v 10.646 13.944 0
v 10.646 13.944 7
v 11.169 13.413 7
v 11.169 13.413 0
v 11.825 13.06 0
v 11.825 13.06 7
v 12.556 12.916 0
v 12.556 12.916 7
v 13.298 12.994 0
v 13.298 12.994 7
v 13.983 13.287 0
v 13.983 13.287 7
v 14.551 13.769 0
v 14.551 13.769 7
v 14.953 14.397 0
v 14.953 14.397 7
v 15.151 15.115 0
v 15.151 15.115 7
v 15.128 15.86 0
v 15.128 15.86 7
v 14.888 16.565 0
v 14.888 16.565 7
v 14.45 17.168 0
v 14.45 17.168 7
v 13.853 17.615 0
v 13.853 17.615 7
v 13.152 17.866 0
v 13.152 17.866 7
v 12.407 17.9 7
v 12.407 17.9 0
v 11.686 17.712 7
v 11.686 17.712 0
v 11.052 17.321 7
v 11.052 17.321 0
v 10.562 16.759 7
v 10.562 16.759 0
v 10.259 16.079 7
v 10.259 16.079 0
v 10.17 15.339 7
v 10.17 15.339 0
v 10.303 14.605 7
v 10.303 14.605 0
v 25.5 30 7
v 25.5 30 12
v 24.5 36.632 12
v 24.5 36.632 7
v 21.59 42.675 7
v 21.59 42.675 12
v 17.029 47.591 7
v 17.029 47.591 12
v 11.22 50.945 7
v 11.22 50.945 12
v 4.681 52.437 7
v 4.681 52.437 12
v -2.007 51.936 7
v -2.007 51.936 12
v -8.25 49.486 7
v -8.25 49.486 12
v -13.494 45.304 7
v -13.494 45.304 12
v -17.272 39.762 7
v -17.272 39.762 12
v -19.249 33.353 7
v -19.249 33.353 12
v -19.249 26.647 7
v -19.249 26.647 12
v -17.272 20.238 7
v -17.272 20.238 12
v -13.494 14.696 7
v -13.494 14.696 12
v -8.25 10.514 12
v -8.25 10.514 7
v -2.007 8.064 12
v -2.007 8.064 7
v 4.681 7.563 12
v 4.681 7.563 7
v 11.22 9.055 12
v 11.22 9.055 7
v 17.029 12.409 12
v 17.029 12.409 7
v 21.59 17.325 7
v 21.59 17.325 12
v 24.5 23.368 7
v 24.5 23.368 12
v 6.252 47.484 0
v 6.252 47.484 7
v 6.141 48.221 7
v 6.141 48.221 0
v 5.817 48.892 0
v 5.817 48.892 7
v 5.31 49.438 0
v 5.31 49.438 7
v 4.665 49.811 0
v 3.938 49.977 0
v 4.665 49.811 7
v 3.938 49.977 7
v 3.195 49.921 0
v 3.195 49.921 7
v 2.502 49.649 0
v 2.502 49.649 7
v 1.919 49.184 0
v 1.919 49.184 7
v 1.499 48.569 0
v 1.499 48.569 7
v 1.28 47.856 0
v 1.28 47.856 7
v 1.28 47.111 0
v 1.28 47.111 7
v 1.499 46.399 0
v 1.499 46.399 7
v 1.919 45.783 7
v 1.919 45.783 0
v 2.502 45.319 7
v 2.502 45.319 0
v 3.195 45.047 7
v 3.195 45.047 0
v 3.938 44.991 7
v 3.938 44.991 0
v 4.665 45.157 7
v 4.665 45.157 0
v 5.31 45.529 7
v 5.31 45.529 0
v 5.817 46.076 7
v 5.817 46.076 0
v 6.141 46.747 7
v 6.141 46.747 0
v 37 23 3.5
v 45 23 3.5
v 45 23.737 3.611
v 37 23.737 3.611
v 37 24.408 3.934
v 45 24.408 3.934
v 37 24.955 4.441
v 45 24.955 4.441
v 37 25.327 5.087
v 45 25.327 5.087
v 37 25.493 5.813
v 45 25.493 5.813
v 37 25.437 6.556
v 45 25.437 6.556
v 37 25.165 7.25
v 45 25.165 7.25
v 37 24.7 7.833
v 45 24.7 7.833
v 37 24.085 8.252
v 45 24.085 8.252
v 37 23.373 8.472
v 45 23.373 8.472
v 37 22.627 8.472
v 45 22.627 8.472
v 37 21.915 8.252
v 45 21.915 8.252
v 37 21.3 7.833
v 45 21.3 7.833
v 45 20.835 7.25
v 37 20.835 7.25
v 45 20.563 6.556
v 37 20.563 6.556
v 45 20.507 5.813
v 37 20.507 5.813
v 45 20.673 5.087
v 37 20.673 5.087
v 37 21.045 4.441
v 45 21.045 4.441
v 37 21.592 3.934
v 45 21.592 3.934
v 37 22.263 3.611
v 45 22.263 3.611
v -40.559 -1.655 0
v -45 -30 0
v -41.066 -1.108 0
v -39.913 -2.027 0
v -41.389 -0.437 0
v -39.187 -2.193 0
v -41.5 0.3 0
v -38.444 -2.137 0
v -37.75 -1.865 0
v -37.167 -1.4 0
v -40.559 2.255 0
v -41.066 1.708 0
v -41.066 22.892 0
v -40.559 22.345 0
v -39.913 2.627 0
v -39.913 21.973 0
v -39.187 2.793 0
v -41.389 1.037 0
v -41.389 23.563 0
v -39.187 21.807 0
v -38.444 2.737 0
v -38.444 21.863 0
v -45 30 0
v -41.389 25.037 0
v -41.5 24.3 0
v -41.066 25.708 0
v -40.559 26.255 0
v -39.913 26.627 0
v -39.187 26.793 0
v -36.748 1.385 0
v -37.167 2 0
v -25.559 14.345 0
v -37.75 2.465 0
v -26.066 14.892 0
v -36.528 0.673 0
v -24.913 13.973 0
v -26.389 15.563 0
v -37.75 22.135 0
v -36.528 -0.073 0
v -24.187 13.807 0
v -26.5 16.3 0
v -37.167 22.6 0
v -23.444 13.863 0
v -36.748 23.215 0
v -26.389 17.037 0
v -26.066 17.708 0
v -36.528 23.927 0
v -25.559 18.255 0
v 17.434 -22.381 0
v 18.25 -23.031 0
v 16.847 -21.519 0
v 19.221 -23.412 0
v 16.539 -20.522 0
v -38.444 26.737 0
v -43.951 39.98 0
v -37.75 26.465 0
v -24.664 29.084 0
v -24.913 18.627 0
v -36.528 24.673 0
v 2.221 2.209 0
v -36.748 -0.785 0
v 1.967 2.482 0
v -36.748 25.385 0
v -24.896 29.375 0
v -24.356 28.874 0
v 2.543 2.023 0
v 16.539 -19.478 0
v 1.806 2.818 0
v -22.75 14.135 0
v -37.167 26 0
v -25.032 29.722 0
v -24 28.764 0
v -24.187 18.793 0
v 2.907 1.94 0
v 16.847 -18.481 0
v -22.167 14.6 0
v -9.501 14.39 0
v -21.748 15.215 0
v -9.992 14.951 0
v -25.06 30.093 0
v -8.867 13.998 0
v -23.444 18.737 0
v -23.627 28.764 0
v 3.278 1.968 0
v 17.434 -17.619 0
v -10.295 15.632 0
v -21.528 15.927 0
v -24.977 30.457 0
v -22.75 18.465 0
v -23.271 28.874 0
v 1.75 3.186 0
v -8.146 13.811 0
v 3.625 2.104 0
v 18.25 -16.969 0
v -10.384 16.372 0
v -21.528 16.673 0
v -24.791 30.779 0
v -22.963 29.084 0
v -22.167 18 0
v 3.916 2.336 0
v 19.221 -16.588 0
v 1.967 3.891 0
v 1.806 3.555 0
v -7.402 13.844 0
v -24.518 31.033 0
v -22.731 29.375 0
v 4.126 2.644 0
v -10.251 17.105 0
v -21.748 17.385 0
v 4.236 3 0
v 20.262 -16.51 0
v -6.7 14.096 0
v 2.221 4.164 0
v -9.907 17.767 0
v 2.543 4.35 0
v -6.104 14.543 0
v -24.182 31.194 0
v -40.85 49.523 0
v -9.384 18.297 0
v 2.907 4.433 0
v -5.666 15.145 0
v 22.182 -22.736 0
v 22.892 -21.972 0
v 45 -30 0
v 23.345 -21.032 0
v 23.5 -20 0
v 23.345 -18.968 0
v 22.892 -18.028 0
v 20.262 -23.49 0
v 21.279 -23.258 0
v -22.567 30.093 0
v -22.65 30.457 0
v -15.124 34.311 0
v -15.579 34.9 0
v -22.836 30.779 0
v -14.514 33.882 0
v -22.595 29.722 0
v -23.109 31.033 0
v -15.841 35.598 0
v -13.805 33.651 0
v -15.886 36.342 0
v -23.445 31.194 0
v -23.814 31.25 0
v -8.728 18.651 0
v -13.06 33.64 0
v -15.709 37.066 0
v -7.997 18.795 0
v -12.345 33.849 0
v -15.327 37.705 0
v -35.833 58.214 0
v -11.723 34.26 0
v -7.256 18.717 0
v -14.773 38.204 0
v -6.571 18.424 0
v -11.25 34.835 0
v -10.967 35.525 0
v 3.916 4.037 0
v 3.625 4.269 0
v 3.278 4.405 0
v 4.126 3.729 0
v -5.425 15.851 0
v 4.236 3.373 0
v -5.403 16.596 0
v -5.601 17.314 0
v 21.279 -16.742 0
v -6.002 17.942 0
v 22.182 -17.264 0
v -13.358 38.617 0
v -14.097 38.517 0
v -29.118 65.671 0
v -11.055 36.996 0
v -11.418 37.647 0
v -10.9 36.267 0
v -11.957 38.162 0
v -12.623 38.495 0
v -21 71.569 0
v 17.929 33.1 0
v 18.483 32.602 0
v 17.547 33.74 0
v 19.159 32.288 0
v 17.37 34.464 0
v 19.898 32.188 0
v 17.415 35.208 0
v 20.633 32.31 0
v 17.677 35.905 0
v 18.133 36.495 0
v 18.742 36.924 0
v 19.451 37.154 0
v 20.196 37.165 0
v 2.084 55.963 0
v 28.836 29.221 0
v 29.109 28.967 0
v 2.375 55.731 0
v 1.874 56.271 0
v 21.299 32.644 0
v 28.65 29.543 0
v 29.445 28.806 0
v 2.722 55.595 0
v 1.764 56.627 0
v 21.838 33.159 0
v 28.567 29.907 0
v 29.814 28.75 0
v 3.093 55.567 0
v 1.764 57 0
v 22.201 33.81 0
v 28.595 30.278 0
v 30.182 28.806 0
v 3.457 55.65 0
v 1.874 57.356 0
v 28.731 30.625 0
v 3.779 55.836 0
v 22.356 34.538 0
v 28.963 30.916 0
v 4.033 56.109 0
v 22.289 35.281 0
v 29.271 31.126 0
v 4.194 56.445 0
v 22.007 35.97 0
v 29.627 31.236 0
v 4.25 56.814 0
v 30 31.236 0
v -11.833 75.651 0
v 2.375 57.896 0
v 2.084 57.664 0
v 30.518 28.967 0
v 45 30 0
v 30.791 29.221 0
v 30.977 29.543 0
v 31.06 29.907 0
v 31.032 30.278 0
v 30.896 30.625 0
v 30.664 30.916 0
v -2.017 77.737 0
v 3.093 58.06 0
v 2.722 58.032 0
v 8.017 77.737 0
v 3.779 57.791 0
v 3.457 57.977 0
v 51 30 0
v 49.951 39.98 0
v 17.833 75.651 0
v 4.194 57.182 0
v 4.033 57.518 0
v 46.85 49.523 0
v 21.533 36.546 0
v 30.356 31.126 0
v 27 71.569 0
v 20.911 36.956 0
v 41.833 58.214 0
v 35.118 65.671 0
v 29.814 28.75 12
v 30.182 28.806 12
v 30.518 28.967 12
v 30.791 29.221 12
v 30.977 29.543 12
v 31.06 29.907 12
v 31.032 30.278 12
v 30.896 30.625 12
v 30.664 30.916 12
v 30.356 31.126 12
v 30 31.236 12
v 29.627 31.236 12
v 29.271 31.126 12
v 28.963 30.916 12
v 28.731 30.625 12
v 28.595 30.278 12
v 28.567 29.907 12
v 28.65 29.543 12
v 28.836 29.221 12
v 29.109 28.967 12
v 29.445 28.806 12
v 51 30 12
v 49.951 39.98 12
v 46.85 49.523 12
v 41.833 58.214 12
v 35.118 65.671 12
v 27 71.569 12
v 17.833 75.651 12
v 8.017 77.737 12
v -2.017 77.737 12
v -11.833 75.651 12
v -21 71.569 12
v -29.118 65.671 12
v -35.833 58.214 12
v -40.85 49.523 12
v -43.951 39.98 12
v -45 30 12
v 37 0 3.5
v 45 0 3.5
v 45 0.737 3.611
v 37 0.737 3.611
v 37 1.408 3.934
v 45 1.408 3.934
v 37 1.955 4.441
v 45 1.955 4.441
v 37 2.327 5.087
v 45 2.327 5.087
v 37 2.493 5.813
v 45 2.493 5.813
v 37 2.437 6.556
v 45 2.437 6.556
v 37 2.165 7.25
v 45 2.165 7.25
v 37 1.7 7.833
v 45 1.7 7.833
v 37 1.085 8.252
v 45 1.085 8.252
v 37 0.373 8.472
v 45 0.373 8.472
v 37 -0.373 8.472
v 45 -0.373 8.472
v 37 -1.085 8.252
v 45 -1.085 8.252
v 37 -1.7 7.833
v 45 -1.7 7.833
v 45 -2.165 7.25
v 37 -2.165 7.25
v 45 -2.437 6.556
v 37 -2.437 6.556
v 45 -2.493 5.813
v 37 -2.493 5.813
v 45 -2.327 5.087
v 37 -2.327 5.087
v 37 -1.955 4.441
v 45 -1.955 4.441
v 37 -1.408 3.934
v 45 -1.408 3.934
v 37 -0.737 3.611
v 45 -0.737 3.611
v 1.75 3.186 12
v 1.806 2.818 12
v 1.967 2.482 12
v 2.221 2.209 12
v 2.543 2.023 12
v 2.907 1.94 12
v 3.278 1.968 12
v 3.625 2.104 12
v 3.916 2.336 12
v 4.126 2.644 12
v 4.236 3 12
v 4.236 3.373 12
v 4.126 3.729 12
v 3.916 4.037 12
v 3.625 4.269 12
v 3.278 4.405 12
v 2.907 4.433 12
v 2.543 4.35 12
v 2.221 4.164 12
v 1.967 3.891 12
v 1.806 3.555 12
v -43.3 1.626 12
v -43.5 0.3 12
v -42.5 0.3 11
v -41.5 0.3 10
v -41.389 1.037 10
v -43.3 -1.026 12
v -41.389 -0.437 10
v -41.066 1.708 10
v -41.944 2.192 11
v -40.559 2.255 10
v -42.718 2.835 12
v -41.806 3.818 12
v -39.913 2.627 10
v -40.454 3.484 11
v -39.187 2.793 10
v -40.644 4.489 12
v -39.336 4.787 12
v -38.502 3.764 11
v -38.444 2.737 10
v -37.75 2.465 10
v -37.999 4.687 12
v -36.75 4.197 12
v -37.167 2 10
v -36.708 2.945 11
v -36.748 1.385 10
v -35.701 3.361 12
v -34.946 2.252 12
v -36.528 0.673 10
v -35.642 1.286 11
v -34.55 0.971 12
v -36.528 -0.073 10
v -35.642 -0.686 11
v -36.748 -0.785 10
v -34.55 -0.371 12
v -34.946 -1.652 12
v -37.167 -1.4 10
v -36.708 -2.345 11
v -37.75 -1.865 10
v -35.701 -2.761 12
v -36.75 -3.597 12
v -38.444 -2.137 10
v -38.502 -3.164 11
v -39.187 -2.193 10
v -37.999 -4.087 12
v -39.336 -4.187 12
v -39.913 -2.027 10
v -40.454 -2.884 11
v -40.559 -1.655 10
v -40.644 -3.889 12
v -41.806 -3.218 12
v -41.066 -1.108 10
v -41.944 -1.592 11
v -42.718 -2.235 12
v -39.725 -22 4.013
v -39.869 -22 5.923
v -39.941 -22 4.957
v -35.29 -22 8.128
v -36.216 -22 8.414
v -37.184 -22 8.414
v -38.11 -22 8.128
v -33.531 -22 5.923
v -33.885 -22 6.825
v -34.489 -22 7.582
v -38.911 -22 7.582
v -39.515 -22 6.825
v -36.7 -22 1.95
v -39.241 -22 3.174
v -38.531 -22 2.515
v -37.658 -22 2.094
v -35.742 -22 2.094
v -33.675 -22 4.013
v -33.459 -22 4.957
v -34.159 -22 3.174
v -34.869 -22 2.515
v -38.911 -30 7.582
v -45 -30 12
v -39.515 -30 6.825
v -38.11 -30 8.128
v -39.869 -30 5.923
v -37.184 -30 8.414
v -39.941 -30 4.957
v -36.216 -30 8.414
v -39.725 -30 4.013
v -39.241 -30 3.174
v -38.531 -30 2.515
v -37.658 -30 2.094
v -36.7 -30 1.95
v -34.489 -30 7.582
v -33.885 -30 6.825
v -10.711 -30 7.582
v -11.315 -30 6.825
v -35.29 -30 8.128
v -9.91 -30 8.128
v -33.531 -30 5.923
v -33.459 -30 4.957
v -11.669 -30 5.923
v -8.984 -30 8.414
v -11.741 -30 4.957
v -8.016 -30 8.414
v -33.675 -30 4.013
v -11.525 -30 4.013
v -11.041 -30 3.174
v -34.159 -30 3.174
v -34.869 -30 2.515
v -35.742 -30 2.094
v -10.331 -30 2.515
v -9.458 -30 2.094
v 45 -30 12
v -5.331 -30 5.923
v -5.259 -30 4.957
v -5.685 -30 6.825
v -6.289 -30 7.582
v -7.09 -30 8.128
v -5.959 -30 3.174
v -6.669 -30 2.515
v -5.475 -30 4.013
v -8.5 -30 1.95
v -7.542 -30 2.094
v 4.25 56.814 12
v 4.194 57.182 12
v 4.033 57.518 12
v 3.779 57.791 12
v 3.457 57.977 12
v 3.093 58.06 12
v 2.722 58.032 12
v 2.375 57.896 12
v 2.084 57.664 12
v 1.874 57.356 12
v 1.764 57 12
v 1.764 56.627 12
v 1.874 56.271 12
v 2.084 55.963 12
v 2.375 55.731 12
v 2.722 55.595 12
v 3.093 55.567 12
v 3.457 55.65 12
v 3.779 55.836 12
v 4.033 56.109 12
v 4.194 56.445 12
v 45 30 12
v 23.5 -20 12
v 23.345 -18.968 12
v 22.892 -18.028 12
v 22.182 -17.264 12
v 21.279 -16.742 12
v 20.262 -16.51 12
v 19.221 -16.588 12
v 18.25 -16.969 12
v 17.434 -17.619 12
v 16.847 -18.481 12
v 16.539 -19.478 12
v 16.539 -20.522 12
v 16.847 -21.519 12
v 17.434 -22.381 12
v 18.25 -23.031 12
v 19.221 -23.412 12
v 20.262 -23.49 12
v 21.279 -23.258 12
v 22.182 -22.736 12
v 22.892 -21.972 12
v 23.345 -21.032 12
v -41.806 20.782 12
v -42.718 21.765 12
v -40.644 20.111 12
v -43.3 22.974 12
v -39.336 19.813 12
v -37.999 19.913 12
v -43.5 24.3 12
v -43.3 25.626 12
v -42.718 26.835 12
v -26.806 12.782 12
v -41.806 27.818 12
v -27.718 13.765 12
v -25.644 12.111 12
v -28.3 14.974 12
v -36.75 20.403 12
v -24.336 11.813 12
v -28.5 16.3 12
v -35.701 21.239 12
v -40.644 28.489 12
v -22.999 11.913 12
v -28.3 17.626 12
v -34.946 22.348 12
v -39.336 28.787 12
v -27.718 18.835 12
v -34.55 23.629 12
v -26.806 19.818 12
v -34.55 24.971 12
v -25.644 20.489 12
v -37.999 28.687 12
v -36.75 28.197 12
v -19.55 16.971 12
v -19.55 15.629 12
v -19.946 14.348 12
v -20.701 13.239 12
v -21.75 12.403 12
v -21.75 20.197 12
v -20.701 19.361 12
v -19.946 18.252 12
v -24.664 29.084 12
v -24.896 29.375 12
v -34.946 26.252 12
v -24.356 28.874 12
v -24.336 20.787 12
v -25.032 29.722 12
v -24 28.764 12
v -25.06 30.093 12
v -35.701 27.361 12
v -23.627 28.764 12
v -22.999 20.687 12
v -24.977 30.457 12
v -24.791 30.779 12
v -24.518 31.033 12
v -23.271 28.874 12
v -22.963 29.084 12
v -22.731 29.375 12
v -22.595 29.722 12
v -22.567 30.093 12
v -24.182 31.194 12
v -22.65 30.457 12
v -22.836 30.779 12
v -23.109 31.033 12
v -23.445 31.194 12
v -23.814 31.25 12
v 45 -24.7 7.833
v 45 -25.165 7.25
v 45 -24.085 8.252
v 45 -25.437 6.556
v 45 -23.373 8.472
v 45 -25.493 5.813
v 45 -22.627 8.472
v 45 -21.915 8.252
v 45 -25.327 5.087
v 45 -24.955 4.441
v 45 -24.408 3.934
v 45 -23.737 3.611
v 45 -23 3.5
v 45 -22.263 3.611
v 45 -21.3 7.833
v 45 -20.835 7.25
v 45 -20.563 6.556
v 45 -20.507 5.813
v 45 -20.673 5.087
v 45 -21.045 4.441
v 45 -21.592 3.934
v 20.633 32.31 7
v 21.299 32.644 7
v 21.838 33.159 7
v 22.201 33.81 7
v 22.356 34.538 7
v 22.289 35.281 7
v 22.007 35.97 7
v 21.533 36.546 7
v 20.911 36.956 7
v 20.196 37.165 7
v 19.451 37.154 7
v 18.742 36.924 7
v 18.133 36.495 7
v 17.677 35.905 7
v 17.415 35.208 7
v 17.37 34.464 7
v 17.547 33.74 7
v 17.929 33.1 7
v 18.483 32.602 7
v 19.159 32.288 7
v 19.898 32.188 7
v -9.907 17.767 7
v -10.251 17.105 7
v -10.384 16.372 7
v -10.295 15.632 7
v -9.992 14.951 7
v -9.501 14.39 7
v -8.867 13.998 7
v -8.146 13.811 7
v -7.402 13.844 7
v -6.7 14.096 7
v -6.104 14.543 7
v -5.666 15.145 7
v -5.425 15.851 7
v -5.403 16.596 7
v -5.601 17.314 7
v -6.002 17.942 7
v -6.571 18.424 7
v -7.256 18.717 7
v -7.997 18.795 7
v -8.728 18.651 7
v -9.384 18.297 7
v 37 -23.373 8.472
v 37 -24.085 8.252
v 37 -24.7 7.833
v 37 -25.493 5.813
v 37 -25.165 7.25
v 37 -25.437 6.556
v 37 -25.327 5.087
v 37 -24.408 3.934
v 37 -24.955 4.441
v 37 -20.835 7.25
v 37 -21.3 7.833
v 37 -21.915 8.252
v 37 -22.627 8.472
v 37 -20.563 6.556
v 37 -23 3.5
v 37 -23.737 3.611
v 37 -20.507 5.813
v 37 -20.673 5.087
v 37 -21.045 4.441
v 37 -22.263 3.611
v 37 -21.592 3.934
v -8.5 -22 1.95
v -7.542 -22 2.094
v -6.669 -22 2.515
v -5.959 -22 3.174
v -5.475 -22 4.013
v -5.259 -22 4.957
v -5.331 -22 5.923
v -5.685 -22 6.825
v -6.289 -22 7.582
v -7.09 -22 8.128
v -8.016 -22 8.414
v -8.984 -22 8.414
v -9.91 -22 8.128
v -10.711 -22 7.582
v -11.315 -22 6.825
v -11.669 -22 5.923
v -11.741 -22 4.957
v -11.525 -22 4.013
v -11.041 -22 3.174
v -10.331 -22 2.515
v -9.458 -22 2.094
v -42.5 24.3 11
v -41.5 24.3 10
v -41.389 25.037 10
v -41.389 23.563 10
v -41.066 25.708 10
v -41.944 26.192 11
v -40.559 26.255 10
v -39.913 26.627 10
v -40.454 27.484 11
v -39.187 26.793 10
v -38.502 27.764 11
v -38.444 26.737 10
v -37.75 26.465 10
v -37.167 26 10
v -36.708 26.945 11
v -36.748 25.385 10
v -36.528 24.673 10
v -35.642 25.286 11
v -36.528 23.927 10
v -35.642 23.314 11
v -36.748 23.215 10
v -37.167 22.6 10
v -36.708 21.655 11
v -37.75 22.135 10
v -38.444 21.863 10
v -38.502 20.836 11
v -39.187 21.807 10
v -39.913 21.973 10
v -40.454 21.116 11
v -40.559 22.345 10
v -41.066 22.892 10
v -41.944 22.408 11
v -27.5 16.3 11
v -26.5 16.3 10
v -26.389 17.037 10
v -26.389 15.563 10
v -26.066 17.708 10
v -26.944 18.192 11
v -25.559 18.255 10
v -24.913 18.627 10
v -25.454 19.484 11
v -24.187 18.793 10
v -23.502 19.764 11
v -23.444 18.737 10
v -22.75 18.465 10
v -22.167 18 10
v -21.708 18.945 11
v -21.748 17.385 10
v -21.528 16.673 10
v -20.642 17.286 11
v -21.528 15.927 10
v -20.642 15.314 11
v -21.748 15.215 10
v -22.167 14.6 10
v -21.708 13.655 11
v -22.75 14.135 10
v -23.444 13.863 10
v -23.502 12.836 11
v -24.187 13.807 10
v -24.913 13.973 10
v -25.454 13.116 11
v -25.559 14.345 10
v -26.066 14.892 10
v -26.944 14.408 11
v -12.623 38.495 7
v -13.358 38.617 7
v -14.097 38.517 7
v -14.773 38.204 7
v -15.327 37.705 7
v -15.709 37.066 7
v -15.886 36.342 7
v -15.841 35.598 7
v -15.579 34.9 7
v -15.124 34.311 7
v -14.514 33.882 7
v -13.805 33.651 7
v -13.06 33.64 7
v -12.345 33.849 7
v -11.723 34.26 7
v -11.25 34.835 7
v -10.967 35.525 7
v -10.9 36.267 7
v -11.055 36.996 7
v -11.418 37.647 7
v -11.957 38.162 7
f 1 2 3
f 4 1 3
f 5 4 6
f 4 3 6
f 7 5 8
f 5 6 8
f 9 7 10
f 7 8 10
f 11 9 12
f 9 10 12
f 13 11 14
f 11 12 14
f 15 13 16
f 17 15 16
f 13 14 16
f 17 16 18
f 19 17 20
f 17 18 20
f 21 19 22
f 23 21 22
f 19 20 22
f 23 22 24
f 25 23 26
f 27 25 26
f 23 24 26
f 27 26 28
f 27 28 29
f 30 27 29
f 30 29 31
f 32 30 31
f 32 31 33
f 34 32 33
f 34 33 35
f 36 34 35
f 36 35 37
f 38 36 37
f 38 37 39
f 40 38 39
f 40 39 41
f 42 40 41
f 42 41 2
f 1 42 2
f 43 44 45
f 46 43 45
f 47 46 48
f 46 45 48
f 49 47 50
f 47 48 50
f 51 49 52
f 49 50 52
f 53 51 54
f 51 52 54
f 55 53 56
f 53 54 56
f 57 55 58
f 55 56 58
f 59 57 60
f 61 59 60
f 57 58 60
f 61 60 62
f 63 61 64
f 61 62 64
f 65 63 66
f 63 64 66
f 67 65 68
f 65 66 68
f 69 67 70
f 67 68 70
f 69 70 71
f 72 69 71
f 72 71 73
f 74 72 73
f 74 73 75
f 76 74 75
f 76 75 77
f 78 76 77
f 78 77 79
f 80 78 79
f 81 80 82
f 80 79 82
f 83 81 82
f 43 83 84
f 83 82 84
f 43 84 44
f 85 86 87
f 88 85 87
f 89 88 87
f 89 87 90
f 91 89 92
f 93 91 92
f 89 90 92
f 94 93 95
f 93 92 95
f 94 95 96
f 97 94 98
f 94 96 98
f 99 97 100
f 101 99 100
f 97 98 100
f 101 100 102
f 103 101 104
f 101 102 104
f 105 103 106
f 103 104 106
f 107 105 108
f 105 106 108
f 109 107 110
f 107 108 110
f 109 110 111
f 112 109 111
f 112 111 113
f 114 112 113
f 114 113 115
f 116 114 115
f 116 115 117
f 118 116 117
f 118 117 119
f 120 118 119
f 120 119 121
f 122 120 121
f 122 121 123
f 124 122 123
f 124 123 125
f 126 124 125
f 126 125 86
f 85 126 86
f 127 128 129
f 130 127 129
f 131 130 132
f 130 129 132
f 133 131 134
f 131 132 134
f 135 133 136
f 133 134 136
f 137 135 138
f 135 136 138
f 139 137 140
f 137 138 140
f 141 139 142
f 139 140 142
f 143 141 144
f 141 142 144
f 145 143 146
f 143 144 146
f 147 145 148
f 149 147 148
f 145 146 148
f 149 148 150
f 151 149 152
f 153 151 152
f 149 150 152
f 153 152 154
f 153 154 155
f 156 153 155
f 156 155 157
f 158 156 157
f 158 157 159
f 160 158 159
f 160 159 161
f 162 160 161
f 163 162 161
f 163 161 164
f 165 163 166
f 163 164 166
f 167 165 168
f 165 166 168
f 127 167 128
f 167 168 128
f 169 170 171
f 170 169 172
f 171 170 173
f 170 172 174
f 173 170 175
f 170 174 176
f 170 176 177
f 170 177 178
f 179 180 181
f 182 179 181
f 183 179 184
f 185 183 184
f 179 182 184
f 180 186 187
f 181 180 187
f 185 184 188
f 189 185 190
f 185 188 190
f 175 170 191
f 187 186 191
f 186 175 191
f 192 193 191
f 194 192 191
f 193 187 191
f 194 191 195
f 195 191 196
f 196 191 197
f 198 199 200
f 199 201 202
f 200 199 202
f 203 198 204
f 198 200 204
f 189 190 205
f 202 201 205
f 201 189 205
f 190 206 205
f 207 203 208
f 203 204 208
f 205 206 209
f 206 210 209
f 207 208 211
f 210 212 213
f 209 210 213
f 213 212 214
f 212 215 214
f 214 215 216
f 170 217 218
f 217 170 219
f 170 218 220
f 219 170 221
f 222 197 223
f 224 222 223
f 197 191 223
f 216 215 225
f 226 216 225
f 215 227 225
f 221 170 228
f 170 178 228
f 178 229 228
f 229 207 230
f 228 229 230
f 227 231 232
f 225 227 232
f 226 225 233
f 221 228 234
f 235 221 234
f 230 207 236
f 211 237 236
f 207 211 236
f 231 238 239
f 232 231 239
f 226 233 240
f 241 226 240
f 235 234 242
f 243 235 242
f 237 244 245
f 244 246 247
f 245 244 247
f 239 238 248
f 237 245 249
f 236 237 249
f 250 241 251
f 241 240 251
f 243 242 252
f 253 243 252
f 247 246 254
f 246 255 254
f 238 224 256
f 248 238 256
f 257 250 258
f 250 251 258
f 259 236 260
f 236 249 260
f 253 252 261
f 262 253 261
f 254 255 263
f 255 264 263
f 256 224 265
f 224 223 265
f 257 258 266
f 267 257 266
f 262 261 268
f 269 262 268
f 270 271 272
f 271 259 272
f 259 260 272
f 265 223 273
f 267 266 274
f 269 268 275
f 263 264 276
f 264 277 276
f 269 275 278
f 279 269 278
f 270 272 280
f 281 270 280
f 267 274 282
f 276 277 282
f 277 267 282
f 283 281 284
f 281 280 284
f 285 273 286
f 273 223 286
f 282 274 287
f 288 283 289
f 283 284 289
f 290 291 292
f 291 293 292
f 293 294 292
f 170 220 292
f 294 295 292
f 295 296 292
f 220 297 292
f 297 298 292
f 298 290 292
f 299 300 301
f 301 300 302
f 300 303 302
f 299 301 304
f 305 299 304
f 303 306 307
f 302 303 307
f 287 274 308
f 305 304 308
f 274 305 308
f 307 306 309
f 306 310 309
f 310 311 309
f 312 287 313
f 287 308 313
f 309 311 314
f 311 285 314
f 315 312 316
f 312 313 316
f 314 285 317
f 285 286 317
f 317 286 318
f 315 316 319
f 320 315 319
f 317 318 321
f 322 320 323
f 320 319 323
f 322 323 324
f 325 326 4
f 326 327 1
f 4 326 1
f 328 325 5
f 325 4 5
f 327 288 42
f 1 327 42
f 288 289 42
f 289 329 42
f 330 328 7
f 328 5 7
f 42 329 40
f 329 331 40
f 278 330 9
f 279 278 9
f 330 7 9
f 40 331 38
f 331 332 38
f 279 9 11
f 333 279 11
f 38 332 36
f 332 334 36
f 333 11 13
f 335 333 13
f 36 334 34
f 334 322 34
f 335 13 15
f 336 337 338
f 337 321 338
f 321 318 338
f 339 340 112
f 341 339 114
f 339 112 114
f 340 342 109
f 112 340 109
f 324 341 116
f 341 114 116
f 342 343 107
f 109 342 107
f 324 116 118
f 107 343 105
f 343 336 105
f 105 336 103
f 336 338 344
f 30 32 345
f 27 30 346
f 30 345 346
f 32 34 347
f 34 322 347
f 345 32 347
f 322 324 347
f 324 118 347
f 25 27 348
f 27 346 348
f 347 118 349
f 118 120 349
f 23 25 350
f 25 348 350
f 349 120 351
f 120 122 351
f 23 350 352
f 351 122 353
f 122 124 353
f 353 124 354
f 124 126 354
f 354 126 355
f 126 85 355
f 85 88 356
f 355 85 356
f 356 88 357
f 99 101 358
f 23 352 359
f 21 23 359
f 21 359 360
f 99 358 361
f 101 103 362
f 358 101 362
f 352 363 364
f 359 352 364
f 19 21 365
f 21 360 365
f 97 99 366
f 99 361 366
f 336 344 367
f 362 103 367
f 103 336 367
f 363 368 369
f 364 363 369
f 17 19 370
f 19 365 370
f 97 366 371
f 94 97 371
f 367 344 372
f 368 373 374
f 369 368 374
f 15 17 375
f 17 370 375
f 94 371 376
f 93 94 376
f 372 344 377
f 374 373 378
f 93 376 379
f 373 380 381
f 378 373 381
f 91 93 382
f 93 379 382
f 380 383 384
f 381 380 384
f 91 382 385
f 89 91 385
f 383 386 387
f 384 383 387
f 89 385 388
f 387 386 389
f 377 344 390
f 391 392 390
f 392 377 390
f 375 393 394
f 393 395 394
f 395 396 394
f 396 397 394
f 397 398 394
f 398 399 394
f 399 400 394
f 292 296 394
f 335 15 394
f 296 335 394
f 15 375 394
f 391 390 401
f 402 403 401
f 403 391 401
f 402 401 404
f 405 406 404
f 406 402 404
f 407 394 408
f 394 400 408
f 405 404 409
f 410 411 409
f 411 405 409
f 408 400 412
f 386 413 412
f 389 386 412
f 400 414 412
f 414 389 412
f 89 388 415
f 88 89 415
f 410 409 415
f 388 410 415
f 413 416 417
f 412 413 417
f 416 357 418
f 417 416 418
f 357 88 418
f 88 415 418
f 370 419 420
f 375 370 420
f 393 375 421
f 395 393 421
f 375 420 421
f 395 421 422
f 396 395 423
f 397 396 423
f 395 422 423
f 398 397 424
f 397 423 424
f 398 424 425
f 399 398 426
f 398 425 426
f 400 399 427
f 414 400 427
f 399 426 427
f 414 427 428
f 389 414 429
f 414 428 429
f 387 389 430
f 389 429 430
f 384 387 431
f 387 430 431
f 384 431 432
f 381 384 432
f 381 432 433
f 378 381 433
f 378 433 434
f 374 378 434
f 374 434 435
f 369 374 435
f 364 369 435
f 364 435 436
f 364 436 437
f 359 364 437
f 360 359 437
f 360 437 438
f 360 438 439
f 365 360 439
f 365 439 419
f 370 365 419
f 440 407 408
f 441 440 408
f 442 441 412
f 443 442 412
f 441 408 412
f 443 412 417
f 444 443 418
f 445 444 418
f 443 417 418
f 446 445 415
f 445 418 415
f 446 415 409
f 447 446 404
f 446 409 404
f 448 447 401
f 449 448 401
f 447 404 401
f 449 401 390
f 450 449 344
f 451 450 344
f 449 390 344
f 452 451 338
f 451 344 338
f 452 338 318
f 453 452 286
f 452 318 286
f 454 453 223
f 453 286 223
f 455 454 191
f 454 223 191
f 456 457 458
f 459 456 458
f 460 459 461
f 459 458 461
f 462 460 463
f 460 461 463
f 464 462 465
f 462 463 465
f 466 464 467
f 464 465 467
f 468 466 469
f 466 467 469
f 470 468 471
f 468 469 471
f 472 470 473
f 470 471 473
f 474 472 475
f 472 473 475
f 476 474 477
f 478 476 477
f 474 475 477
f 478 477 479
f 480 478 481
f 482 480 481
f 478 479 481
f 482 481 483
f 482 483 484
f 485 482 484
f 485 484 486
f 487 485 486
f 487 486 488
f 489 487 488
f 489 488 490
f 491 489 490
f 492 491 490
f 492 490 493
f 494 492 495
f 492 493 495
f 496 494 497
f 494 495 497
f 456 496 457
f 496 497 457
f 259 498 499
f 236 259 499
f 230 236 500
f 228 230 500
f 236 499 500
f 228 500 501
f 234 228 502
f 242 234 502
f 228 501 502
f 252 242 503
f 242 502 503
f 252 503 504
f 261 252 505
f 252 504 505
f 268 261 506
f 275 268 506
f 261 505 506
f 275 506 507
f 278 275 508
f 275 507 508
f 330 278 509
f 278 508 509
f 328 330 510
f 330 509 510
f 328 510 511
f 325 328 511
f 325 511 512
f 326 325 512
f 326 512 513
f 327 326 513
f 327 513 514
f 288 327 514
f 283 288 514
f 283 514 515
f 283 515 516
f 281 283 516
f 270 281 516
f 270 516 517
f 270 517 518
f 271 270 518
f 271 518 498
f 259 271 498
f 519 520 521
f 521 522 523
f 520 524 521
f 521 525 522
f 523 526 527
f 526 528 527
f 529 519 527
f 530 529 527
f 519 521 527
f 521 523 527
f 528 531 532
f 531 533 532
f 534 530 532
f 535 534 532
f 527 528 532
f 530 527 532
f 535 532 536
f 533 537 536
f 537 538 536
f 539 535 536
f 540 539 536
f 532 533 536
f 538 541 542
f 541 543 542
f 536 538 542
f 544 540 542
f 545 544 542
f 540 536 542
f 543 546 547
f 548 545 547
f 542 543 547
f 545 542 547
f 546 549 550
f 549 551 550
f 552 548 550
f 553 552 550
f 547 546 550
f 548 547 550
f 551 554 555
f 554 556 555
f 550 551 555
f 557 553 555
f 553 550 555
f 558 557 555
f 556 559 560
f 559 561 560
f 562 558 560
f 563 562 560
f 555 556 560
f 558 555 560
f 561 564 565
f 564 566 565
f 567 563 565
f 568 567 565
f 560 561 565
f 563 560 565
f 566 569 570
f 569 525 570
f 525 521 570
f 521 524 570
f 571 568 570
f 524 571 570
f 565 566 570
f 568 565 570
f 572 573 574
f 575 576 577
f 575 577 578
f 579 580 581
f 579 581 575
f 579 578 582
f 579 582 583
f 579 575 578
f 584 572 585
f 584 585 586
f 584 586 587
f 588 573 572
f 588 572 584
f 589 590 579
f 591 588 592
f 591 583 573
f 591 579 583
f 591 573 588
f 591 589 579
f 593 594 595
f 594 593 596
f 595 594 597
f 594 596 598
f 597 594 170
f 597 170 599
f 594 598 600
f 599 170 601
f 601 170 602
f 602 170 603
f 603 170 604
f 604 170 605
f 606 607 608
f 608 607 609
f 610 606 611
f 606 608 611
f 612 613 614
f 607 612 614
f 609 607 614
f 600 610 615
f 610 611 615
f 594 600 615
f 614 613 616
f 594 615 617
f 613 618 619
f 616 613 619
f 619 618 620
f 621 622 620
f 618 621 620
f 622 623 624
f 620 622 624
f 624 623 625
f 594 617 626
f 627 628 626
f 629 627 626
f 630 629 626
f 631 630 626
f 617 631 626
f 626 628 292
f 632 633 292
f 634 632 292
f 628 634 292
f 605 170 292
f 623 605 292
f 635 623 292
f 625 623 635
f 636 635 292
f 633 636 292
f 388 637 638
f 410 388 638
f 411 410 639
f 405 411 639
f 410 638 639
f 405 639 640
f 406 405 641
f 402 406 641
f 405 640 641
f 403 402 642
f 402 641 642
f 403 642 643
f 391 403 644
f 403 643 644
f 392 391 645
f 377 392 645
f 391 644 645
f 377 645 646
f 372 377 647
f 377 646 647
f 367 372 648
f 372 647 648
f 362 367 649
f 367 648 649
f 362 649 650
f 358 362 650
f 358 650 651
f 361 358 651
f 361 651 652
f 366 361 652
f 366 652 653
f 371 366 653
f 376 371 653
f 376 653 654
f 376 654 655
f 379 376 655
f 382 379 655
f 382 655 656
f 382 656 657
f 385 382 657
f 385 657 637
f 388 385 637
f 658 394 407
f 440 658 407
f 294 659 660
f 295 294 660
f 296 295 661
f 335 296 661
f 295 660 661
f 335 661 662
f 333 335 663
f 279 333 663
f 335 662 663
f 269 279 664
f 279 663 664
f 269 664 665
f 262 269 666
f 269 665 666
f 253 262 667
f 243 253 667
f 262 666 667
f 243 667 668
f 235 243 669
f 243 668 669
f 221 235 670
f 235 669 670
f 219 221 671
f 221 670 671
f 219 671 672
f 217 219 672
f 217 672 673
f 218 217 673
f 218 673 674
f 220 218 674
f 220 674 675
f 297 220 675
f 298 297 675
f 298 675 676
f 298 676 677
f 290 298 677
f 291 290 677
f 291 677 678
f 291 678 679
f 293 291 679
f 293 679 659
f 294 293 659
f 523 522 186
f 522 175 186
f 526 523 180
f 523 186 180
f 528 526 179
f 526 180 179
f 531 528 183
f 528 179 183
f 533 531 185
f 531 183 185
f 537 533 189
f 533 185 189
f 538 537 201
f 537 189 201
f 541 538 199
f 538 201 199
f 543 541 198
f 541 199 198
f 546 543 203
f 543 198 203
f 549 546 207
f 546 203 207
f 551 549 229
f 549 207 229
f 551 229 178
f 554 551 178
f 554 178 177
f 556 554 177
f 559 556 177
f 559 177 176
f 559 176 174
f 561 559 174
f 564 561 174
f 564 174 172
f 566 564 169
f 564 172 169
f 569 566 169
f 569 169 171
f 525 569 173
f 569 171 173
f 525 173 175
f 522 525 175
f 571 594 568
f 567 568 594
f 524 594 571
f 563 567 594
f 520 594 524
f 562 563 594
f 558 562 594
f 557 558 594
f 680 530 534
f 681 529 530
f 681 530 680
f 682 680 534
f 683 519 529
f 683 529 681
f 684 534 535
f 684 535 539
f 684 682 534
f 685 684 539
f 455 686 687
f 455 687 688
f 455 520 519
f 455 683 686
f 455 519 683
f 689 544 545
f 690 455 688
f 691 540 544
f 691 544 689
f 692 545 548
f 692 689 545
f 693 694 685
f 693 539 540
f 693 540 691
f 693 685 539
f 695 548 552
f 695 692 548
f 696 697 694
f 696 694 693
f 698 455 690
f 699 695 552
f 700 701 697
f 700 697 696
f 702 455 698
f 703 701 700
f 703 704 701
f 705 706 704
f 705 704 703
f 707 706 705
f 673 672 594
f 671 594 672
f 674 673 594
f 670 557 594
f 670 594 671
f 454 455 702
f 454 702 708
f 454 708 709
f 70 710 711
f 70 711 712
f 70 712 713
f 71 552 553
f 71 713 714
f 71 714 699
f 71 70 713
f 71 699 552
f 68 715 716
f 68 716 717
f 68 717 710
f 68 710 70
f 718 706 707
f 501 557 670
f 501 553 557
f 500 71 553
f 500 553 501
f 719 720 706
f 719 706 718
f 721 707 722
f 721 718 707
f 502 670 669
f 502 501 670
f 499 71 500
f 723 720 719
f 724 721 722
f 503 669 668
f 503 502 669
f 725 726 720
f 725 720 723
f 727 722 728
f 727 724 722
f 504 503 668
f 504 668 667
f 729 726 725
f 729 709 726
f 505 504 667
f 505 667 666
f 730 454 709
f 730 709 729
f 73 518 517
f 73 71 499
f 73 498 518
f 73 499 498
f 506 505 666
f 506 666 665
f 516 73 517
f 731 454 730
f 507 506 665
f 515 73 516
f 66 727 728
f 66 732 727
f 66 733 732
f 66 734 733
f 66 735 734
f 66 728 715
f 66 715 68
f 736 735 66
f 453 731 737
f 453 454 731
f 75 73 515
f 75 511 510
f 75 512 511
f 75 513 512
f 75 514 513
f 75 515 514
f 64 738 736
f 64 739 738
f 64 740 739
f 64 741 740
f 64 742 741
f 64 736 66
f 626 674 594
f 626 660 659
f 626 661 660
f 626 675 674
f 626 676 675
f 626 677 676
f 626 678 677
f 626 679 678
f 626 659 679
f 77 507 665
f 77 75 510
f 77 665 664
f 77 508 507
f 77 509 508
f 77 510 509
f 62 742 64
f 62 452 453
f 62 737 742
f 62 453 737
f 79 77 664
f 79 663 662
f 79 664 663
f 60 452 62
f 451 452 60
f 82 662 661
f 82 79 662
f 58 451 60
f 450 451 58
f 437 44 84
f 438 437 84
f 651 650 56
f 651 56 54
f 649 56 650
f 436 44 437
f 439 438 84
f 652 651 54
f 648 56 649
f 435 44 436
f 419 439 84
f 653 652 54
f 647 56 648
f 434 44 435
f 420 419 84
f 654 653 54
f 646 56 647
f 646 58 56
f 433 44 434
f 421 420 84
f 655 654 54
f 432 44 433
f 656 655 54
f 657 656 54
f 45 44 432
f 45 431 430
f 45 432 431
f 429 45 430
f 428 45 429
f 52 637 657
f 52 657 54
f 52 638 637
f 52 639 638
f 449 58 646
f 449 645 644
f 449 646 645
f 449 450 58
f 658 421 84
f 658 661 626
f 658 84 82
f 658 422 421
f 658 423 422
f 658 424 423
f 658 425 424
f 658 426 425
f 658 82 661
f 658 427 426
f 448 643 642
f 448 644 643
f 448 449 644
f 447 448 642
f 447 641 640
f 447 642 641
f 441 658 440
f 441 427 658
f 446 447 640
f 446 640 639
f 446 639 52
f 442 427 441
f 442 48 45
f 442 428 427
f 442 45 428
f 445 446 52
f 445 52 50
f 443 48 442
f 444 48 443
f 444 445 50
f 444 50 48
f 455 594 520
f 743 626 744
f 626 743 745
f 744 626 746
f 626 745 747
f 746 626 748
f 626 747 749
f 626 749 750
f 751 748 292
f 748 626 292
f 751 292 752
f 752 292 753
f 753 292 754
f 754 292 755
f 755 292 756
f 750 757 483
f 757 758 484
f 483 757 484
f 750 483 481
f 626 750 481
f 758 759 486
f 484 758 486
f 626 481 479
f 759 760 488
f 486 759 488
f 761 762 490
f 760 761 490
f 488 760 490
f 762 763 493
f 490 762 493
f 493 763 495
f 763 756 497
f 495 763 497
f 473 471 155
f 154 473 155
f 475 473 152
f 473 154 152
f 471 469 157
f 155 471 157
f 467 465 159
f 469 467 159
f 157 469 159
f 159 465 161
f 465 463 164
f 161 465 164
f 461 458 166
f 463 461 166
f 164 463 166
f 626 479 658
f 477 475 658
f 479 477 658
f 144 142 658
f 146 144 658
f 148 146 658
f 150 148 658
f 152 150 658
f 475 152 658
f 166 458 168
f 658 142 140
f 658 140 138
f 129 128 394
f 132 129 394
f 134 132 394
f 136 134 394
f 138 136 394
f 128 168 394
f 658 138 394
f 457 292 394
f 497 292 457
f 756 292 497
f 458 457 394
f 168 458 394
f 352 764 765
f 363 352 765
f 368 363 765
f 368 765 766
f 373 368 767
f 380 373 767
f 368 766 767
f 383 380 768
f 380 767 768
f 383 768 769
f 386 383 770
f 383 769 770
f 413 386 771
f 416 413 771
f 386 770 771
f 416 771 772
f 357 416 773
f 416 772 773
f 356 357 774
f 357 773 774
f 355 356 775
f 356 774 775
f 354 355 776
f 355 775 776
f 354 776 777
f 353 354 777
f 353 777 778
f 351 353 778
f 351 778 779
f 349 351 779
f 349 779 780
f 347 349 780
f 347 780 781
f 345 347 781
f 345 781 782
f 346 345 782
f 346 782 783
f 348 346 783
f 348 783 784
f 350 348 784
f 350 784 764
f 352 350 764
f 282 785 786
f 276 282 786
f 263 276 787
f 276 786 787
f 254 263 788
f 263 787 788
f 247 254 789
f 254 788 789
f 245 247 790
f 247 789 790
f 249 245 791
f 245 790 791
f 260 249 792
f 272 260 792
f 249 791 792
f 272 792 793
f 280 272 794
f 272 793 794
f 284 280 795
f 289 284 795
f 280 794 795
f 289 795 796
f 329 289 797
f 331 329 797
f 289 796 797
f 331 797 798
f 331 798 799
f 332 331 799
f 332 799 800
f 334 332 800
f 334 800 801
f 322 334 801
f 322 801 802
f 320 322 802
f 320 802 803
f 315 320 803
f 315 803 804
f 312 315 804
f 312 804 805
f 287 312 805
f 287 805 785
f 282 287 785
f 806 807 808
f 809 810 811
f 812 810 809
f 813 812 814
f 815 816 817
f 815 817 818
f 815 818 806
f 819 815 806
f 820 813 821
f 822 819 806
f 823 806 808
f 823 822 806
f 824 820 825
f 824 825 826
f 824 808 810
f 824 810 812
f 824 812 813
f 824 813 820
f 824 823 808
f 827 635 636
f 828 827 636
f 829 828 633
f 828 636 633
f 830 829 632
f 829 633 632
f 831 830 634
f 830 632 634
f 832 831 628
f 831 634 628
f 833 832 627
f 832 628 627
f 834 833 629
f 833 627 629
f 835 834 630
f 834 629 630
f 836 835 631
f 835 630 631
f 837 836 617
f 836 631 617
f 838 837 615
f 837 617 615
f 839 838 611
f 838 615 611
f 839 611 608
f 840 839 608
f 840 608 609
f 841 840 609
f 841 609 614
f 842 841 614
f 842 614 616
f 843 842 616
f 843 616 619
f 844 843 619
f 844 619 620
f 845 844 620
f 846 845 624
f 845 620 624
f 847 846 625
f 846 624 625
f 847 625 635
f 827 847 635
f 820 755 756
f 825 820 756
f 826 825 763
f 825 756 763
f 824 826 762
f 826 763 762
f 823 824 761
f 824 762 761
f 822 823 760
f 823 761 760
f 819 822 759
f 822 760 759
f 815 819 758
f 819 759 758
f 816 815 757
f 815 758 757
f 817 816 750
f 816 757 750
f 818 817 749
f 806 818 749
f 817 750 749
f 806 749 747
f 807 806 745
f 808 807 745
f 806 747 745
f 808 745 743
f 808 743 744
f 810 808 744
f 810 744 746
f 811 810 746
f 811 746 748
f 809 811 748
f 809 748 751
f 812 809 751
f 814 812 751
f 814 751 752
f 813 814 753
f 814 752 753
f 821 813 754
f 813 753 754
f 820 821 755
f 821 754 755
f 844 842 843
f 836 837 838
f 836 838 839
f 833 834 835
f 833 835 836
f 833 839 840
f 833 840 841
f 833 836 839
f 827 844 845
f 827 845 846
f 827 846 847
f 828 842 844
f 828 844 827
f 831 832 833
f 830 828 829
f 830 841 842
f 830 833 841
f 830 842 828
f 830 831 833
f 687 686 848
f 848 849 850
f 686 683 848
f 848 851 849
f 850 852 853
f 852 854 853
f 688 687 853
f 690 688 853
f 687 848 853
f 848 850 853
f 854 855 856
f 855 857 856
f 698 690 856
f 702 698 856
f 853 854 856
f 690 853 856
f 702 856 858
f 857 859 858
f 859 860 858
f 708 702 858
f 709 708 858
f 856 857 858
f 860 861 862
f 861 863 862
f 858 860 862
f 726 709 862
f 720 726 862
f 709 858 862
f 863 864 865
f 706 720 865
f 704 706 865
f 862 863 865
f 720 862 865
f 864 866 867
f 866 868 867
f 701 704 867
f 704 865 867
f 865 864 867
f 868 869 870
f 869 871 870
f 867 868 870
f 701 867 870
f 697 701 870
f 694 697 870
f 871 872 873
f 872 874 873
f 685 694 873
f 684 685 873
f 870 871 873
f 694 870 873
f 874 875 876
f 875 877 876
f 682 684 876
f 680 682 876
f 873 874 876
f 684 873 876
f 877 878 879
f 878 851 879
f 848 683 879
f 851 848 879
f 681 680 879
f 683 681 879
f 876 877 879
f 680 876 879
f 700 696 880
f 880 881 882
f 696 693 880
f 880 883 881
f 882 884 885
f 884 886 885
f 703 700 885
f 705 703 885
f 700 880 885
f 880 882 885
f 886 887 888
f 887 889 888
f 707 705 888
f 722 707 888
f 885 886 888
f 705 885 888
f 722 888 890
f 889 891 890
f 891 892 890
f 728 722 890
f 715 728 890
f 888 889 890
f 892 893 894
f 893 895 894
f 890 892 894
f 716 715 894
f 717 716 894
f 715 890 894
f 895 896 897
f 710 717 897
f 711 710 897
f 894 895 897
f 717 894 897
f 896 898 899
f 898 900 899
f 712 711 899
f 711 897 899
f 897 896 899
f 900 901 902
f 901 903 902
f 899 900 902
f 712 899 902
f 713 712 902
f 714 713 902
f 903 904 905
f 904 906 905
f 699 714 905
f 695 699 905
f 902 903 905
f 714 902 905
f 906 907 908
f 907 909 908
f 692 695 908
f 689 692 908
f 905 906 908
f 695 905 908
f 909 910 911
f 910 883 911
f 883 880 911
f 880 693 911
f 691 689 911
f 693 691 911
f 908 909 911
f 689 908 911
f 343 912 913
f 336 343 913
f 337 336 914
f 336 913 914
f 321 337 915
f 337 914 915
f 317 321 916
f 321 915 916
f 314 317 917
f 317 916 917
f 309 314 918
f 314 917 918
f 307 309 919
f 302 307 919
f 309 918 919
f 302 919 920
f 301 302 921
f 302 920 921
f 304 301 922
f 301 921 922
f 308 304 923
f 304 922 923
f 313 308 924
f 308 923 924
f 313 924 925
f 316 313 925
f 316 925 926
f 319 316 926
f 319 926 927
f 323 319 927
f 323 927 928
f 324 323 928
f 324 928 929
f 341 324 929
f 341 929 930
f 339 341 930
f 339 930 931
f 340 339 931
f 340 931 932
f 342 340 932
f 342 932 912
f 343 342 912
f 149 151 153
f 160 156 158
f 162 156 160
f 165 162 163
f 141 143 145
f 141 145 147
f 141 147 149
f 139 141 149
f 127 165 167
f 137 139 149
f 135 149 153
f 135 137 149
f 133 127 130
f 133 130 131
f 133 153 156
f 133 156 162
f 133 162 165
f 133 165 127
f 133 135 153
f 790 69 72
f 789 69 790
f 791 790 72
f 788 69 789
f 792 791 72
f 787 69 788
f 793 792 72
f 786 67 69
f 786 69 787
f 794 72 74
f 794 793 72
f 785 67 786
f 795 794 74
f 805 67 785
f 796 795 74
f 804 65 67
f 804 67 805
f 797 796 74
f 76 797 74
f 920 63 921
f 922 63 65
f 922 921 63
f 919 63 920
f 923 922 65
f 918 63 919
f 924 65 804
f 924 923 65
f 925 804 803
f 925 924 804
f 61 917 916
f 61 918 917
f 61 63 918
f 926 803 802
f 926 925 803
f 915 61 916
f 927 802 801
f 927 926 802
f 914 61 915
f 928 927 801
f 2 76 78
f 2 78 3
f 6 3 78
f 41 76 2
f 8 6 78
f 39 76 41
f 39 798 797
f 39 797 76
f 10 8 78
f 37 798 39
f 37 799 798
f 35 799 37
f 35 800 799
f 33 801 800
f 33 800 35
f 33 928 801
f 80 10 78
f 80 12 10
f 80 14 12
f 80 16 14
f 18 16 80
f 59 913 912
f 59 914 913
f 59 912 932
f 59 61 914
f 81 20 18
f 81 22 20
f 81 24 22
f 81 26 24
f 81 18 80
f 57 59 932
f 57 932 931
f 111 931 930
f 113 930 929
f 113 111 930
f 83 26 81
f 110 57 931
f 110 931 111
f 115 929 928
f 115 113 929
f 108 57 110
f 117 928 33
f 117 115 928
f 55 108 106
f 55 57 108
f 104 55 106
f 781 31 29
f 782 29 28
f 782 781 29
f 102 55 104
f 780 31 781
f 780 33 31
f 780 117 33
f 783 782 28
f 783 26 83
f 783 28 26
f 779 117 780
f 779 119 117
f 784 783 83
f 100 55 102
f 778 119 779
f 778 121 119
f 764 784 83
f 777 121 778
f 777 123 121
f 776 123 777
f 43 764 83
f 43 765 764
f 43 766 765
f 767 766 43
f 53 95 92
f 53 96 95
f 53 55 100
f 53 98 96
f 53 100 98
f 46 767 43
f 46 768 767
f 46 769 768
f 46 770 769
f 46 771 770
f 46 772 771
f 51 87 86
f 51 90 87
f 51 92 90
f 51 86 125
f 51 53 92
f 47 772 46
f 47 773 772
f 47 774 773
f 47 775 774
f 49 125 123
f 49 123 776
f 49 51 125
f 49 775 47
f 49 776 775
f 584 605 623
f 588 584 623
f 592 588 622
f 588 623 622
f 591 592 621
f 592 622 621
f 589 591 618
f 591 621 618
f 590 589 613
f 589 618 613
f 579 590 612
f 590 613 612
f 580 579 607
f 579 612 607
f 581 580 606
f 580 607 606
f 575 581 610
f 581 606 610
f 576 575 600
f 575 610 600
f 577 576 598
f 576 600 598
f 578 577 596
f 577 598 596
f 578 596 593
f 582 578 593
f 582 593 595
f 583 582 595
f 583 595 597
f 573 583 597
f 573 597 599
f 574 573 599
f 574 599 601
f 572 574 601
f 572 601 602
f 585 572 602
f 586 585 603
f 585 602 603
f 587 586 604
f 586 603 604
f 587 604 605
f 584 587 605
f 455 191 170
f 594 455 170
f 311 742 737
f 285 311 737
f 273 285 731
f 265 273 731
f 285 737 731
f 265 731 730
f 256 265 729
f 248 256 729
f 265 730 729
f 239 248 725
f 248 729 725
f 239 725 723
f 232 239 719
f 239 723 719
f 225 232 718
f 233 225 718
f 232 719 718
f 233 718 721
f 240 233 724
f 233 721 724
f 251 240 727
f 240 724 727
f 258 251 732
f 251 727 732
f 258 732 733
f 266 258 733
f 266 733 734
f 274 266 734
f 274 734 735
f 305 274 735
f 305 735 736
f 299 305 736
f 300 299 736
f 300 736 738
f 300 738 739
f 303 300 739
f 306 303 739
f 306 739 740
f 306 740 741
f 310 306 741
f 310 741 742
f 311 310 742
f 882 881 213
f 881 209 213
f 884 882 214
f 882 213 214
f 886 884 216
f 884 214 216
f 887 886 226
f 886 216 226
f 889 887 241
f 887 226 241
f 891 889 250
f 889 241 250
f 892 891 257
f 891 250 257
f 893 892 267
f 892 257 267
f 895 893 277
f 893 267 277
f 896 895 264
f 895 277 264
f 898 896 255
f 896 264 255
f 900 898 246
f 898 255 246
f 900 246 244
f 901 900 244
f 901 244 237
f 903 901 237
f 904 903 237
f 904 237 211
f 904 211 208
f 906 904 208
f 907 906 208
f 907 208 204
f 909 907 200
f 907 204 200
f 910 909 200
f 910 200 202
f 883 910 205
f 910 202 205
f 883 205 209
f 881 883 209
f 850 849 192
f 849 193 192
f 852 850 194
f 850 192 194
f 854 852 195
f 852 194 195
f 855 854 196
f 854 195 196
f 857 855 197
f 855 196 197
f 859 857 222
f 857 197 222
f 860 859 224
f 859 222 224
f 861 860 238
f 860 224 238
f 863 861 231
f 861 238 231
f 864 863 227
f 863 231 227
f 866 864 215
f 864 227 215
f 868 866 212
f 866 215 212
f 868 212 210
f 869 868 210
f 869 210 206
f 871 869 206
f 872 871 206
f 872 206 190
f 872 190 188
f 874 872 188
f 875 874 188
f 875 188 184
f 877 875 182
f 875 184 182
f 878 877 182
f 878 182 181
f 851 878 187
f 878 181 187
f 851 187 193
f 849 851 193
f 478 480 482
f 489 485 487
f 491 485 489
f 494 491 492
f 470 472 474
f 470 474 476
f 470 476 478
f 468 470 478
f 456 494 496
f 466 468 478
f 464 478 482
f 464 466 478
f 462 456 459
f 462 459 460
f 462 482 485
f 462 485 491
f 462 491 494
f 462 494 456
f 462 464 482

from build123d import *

# Parameters (mm, degrees)
BOSS_EXTRUDE1_DEPTH                             = 12
SKETCH2_R                                       = 22.5
CUT_EXTRUDE1_DEPTH                              = 5
SKETCH3_R                                       = 2.5
CUT_EXTRUDE2_DEPTH                              = 94.45587194
CIRPATTERN1_COUNT                               = 5
SKETCH4_R                                       = 1.25
CUT_EXTRUDE3_DEPTH                              = 94.96275858
CIRPATTERN2_COUNT                               = 4
SKETCH11_R                                      = 3.5
CUT_EXTRUDE8_DEPTH                              = 14.5
SKETCH13_R                                      = 3.25
CUT_EXTRUDE9_DEPTH                              = 8
LPATTERN2_COUNT                                 = 2
LPATTERN2_PITCH                                 = 28.2
SKETCH14_R                                      = 2.5
CUT_EXTRUDE10_DEPTH                             = 8
LPATTERN3_COUNT                                 = 3
LPATTERN3_PITCH                                 = 23
CSK_FOR_M5_FLAT_HEAD_MACHINE_SCREW1_D           = 5
CSK_FOR_M5_FLAT_HEAD_MACHINE_SCREW1_CSINK_D     = 9
CSK_FOR_M5_FLAT_HEAD_MACHINE_SCREW1_CSINK_ANGLE = 90


with BuildPart() as part:
    # Sketch1 → Boss-Extrude1 (new body)
    with BuildSketch(Plane.XY):
        with BuildLine():
            Line((45, 30), (51, 30))
            ThreePointArc((51, 30), (3, 78), (-45, 30))
            Line((-45, 30), (-45, -30))
            Line((-45, -30), (45, -30))
            Line((45, -30), (45, 30))
        make_face()
    extrude(amount=BOSS_EXTRUDE1_DEPTH)

    # Sketch2 → Cut-Extrude1 (cut)
    with BuildSketch(Plane.XY.offset(12)):
        with Locations((3, 30)):
            Circle(SKETCH2_R)
    extrude(amount=-CUT_EXTRUDE1_DEPTH, mode=Mode.SUBTRACT)

    # Sketch3 → Cut-Extrude2 (cut, through all)
    with BuildSketch(Plane.XY.offset(7)):
        with Locations((3.751645972, 47.483850501)):
            Circle(SKETCH3_R)
    cut_extrude2 = extrude(amount=-CUT_EXTRUDE2_DEPTH, mode=Mode.SUBTRACT)

    # CirPattern1: Cut-Extrude2 ×5 about axis
    cirpattern1_axis = Axis((3, 30, 0), (0, 0, 1))
    for i in range(1, CIRPATTERN1_COUNT):
        add(cut_extrude2.rotate(cirpattern1_axis, i * 360 / CIRPATTERN1_COUNT), mode=Mode.SUBTRACT)

    # Sketch4 → Cut-Extrude3 (cut, through all)
    with BuildSketch(Plane.XY.offset(12)):
        with Locations((3, 56.81356815)):
            Circle(SKETCH4_R)
    cut_extrude3 = extrude(amount=-CUT_EXTRUDE3_DEPTH, mode=Mode.SUBTRACT)

    # CirPattern2: Cut-Extrude3 ×4 about axis
    cirpattern2_axis = Axis((3, 30, 0), (0, 0, 1))
    for i in range(1, CIRPATTERN2_COUNT):
        add(cut_extrude3.rotate(cirpattern2_axis, i * 360 / CIRPATTERN2_COUNT), mode=Mode.SUBTRACT)

    # Sketch11 → Cut-Extrude8 (cut)
    with BuildSketch(Plane.XY.offset(12)):
        with Locations((20, -20)):
            Circle(SKETCH11_R)
    extrude(amount=-CUT_EXTRUDE8_DEPTH, mode=Mode.SUBTRACT)

    # Sketch13 → Cut-Extrude9 (cut)
    with BuildSketch(Plane.XZ.offset(30)):
        with Locations(Location((-36.7, 5.2, 0), (0, 0, 270))):
            Circle(SKETCH13_R)
    cut_extrude9 = extrude(amount=-CUT_EXTRUDE9_DEPTH, mode=Mode.SUBTRACT)

    # LPattern2: Cut-Extrude9 ×2
    with Locations(*[(i * LPATTERN2_PITCH, 0, 0) for i in range(1, LPATTERN2_COUNT)]):
        add(cut_extrude9, mode=Mode.SUBTRACT)

    # Sketch14 → Cut-Extrude10 (cut)
    with BuildSketch(Plane(origin=(45, 0, 0), x_dir=(0, 0, -1), z_dir=(1, 0, 0))):
        with Locations((-6, -23)):
            Circle(SKETCH14_R)
    cut_extrude10 = extrude(amount=-CUT_EXTRUDE10_DEPTH, mode=Mode.SUBTRACT)

    # LPattern3: Cut-Extrude10 ×3
    with Locations(*[(0, i * LPATTERN3_PITCH, 0) for i in range(1, LPATTERN3_COUNT)]):
        add(cut_extrude10, mode=Mode.SUBTRACT)

    # CSK for M5 Flat Head Machine Screw1 (through all)
    with Locations(Plane.XY.offset(12)):
        with Locations((-39, 24.3), (-39, 0.3), (-24, 16.3)):
            CounterSinkHole(CSK_FOR_M5_FLAT_HEAD_MACHINE_SCREW1_D / 2, CSK_FOR_M5_FLAT_HEAD_MACHINE_SCREW1_CSINK_D / 2, counter_sink_angle=CSK_FOR_M5_FLAT_HEAD_MACHINE_SCREW1_CSINK_ANGLE)


solid = part.part
